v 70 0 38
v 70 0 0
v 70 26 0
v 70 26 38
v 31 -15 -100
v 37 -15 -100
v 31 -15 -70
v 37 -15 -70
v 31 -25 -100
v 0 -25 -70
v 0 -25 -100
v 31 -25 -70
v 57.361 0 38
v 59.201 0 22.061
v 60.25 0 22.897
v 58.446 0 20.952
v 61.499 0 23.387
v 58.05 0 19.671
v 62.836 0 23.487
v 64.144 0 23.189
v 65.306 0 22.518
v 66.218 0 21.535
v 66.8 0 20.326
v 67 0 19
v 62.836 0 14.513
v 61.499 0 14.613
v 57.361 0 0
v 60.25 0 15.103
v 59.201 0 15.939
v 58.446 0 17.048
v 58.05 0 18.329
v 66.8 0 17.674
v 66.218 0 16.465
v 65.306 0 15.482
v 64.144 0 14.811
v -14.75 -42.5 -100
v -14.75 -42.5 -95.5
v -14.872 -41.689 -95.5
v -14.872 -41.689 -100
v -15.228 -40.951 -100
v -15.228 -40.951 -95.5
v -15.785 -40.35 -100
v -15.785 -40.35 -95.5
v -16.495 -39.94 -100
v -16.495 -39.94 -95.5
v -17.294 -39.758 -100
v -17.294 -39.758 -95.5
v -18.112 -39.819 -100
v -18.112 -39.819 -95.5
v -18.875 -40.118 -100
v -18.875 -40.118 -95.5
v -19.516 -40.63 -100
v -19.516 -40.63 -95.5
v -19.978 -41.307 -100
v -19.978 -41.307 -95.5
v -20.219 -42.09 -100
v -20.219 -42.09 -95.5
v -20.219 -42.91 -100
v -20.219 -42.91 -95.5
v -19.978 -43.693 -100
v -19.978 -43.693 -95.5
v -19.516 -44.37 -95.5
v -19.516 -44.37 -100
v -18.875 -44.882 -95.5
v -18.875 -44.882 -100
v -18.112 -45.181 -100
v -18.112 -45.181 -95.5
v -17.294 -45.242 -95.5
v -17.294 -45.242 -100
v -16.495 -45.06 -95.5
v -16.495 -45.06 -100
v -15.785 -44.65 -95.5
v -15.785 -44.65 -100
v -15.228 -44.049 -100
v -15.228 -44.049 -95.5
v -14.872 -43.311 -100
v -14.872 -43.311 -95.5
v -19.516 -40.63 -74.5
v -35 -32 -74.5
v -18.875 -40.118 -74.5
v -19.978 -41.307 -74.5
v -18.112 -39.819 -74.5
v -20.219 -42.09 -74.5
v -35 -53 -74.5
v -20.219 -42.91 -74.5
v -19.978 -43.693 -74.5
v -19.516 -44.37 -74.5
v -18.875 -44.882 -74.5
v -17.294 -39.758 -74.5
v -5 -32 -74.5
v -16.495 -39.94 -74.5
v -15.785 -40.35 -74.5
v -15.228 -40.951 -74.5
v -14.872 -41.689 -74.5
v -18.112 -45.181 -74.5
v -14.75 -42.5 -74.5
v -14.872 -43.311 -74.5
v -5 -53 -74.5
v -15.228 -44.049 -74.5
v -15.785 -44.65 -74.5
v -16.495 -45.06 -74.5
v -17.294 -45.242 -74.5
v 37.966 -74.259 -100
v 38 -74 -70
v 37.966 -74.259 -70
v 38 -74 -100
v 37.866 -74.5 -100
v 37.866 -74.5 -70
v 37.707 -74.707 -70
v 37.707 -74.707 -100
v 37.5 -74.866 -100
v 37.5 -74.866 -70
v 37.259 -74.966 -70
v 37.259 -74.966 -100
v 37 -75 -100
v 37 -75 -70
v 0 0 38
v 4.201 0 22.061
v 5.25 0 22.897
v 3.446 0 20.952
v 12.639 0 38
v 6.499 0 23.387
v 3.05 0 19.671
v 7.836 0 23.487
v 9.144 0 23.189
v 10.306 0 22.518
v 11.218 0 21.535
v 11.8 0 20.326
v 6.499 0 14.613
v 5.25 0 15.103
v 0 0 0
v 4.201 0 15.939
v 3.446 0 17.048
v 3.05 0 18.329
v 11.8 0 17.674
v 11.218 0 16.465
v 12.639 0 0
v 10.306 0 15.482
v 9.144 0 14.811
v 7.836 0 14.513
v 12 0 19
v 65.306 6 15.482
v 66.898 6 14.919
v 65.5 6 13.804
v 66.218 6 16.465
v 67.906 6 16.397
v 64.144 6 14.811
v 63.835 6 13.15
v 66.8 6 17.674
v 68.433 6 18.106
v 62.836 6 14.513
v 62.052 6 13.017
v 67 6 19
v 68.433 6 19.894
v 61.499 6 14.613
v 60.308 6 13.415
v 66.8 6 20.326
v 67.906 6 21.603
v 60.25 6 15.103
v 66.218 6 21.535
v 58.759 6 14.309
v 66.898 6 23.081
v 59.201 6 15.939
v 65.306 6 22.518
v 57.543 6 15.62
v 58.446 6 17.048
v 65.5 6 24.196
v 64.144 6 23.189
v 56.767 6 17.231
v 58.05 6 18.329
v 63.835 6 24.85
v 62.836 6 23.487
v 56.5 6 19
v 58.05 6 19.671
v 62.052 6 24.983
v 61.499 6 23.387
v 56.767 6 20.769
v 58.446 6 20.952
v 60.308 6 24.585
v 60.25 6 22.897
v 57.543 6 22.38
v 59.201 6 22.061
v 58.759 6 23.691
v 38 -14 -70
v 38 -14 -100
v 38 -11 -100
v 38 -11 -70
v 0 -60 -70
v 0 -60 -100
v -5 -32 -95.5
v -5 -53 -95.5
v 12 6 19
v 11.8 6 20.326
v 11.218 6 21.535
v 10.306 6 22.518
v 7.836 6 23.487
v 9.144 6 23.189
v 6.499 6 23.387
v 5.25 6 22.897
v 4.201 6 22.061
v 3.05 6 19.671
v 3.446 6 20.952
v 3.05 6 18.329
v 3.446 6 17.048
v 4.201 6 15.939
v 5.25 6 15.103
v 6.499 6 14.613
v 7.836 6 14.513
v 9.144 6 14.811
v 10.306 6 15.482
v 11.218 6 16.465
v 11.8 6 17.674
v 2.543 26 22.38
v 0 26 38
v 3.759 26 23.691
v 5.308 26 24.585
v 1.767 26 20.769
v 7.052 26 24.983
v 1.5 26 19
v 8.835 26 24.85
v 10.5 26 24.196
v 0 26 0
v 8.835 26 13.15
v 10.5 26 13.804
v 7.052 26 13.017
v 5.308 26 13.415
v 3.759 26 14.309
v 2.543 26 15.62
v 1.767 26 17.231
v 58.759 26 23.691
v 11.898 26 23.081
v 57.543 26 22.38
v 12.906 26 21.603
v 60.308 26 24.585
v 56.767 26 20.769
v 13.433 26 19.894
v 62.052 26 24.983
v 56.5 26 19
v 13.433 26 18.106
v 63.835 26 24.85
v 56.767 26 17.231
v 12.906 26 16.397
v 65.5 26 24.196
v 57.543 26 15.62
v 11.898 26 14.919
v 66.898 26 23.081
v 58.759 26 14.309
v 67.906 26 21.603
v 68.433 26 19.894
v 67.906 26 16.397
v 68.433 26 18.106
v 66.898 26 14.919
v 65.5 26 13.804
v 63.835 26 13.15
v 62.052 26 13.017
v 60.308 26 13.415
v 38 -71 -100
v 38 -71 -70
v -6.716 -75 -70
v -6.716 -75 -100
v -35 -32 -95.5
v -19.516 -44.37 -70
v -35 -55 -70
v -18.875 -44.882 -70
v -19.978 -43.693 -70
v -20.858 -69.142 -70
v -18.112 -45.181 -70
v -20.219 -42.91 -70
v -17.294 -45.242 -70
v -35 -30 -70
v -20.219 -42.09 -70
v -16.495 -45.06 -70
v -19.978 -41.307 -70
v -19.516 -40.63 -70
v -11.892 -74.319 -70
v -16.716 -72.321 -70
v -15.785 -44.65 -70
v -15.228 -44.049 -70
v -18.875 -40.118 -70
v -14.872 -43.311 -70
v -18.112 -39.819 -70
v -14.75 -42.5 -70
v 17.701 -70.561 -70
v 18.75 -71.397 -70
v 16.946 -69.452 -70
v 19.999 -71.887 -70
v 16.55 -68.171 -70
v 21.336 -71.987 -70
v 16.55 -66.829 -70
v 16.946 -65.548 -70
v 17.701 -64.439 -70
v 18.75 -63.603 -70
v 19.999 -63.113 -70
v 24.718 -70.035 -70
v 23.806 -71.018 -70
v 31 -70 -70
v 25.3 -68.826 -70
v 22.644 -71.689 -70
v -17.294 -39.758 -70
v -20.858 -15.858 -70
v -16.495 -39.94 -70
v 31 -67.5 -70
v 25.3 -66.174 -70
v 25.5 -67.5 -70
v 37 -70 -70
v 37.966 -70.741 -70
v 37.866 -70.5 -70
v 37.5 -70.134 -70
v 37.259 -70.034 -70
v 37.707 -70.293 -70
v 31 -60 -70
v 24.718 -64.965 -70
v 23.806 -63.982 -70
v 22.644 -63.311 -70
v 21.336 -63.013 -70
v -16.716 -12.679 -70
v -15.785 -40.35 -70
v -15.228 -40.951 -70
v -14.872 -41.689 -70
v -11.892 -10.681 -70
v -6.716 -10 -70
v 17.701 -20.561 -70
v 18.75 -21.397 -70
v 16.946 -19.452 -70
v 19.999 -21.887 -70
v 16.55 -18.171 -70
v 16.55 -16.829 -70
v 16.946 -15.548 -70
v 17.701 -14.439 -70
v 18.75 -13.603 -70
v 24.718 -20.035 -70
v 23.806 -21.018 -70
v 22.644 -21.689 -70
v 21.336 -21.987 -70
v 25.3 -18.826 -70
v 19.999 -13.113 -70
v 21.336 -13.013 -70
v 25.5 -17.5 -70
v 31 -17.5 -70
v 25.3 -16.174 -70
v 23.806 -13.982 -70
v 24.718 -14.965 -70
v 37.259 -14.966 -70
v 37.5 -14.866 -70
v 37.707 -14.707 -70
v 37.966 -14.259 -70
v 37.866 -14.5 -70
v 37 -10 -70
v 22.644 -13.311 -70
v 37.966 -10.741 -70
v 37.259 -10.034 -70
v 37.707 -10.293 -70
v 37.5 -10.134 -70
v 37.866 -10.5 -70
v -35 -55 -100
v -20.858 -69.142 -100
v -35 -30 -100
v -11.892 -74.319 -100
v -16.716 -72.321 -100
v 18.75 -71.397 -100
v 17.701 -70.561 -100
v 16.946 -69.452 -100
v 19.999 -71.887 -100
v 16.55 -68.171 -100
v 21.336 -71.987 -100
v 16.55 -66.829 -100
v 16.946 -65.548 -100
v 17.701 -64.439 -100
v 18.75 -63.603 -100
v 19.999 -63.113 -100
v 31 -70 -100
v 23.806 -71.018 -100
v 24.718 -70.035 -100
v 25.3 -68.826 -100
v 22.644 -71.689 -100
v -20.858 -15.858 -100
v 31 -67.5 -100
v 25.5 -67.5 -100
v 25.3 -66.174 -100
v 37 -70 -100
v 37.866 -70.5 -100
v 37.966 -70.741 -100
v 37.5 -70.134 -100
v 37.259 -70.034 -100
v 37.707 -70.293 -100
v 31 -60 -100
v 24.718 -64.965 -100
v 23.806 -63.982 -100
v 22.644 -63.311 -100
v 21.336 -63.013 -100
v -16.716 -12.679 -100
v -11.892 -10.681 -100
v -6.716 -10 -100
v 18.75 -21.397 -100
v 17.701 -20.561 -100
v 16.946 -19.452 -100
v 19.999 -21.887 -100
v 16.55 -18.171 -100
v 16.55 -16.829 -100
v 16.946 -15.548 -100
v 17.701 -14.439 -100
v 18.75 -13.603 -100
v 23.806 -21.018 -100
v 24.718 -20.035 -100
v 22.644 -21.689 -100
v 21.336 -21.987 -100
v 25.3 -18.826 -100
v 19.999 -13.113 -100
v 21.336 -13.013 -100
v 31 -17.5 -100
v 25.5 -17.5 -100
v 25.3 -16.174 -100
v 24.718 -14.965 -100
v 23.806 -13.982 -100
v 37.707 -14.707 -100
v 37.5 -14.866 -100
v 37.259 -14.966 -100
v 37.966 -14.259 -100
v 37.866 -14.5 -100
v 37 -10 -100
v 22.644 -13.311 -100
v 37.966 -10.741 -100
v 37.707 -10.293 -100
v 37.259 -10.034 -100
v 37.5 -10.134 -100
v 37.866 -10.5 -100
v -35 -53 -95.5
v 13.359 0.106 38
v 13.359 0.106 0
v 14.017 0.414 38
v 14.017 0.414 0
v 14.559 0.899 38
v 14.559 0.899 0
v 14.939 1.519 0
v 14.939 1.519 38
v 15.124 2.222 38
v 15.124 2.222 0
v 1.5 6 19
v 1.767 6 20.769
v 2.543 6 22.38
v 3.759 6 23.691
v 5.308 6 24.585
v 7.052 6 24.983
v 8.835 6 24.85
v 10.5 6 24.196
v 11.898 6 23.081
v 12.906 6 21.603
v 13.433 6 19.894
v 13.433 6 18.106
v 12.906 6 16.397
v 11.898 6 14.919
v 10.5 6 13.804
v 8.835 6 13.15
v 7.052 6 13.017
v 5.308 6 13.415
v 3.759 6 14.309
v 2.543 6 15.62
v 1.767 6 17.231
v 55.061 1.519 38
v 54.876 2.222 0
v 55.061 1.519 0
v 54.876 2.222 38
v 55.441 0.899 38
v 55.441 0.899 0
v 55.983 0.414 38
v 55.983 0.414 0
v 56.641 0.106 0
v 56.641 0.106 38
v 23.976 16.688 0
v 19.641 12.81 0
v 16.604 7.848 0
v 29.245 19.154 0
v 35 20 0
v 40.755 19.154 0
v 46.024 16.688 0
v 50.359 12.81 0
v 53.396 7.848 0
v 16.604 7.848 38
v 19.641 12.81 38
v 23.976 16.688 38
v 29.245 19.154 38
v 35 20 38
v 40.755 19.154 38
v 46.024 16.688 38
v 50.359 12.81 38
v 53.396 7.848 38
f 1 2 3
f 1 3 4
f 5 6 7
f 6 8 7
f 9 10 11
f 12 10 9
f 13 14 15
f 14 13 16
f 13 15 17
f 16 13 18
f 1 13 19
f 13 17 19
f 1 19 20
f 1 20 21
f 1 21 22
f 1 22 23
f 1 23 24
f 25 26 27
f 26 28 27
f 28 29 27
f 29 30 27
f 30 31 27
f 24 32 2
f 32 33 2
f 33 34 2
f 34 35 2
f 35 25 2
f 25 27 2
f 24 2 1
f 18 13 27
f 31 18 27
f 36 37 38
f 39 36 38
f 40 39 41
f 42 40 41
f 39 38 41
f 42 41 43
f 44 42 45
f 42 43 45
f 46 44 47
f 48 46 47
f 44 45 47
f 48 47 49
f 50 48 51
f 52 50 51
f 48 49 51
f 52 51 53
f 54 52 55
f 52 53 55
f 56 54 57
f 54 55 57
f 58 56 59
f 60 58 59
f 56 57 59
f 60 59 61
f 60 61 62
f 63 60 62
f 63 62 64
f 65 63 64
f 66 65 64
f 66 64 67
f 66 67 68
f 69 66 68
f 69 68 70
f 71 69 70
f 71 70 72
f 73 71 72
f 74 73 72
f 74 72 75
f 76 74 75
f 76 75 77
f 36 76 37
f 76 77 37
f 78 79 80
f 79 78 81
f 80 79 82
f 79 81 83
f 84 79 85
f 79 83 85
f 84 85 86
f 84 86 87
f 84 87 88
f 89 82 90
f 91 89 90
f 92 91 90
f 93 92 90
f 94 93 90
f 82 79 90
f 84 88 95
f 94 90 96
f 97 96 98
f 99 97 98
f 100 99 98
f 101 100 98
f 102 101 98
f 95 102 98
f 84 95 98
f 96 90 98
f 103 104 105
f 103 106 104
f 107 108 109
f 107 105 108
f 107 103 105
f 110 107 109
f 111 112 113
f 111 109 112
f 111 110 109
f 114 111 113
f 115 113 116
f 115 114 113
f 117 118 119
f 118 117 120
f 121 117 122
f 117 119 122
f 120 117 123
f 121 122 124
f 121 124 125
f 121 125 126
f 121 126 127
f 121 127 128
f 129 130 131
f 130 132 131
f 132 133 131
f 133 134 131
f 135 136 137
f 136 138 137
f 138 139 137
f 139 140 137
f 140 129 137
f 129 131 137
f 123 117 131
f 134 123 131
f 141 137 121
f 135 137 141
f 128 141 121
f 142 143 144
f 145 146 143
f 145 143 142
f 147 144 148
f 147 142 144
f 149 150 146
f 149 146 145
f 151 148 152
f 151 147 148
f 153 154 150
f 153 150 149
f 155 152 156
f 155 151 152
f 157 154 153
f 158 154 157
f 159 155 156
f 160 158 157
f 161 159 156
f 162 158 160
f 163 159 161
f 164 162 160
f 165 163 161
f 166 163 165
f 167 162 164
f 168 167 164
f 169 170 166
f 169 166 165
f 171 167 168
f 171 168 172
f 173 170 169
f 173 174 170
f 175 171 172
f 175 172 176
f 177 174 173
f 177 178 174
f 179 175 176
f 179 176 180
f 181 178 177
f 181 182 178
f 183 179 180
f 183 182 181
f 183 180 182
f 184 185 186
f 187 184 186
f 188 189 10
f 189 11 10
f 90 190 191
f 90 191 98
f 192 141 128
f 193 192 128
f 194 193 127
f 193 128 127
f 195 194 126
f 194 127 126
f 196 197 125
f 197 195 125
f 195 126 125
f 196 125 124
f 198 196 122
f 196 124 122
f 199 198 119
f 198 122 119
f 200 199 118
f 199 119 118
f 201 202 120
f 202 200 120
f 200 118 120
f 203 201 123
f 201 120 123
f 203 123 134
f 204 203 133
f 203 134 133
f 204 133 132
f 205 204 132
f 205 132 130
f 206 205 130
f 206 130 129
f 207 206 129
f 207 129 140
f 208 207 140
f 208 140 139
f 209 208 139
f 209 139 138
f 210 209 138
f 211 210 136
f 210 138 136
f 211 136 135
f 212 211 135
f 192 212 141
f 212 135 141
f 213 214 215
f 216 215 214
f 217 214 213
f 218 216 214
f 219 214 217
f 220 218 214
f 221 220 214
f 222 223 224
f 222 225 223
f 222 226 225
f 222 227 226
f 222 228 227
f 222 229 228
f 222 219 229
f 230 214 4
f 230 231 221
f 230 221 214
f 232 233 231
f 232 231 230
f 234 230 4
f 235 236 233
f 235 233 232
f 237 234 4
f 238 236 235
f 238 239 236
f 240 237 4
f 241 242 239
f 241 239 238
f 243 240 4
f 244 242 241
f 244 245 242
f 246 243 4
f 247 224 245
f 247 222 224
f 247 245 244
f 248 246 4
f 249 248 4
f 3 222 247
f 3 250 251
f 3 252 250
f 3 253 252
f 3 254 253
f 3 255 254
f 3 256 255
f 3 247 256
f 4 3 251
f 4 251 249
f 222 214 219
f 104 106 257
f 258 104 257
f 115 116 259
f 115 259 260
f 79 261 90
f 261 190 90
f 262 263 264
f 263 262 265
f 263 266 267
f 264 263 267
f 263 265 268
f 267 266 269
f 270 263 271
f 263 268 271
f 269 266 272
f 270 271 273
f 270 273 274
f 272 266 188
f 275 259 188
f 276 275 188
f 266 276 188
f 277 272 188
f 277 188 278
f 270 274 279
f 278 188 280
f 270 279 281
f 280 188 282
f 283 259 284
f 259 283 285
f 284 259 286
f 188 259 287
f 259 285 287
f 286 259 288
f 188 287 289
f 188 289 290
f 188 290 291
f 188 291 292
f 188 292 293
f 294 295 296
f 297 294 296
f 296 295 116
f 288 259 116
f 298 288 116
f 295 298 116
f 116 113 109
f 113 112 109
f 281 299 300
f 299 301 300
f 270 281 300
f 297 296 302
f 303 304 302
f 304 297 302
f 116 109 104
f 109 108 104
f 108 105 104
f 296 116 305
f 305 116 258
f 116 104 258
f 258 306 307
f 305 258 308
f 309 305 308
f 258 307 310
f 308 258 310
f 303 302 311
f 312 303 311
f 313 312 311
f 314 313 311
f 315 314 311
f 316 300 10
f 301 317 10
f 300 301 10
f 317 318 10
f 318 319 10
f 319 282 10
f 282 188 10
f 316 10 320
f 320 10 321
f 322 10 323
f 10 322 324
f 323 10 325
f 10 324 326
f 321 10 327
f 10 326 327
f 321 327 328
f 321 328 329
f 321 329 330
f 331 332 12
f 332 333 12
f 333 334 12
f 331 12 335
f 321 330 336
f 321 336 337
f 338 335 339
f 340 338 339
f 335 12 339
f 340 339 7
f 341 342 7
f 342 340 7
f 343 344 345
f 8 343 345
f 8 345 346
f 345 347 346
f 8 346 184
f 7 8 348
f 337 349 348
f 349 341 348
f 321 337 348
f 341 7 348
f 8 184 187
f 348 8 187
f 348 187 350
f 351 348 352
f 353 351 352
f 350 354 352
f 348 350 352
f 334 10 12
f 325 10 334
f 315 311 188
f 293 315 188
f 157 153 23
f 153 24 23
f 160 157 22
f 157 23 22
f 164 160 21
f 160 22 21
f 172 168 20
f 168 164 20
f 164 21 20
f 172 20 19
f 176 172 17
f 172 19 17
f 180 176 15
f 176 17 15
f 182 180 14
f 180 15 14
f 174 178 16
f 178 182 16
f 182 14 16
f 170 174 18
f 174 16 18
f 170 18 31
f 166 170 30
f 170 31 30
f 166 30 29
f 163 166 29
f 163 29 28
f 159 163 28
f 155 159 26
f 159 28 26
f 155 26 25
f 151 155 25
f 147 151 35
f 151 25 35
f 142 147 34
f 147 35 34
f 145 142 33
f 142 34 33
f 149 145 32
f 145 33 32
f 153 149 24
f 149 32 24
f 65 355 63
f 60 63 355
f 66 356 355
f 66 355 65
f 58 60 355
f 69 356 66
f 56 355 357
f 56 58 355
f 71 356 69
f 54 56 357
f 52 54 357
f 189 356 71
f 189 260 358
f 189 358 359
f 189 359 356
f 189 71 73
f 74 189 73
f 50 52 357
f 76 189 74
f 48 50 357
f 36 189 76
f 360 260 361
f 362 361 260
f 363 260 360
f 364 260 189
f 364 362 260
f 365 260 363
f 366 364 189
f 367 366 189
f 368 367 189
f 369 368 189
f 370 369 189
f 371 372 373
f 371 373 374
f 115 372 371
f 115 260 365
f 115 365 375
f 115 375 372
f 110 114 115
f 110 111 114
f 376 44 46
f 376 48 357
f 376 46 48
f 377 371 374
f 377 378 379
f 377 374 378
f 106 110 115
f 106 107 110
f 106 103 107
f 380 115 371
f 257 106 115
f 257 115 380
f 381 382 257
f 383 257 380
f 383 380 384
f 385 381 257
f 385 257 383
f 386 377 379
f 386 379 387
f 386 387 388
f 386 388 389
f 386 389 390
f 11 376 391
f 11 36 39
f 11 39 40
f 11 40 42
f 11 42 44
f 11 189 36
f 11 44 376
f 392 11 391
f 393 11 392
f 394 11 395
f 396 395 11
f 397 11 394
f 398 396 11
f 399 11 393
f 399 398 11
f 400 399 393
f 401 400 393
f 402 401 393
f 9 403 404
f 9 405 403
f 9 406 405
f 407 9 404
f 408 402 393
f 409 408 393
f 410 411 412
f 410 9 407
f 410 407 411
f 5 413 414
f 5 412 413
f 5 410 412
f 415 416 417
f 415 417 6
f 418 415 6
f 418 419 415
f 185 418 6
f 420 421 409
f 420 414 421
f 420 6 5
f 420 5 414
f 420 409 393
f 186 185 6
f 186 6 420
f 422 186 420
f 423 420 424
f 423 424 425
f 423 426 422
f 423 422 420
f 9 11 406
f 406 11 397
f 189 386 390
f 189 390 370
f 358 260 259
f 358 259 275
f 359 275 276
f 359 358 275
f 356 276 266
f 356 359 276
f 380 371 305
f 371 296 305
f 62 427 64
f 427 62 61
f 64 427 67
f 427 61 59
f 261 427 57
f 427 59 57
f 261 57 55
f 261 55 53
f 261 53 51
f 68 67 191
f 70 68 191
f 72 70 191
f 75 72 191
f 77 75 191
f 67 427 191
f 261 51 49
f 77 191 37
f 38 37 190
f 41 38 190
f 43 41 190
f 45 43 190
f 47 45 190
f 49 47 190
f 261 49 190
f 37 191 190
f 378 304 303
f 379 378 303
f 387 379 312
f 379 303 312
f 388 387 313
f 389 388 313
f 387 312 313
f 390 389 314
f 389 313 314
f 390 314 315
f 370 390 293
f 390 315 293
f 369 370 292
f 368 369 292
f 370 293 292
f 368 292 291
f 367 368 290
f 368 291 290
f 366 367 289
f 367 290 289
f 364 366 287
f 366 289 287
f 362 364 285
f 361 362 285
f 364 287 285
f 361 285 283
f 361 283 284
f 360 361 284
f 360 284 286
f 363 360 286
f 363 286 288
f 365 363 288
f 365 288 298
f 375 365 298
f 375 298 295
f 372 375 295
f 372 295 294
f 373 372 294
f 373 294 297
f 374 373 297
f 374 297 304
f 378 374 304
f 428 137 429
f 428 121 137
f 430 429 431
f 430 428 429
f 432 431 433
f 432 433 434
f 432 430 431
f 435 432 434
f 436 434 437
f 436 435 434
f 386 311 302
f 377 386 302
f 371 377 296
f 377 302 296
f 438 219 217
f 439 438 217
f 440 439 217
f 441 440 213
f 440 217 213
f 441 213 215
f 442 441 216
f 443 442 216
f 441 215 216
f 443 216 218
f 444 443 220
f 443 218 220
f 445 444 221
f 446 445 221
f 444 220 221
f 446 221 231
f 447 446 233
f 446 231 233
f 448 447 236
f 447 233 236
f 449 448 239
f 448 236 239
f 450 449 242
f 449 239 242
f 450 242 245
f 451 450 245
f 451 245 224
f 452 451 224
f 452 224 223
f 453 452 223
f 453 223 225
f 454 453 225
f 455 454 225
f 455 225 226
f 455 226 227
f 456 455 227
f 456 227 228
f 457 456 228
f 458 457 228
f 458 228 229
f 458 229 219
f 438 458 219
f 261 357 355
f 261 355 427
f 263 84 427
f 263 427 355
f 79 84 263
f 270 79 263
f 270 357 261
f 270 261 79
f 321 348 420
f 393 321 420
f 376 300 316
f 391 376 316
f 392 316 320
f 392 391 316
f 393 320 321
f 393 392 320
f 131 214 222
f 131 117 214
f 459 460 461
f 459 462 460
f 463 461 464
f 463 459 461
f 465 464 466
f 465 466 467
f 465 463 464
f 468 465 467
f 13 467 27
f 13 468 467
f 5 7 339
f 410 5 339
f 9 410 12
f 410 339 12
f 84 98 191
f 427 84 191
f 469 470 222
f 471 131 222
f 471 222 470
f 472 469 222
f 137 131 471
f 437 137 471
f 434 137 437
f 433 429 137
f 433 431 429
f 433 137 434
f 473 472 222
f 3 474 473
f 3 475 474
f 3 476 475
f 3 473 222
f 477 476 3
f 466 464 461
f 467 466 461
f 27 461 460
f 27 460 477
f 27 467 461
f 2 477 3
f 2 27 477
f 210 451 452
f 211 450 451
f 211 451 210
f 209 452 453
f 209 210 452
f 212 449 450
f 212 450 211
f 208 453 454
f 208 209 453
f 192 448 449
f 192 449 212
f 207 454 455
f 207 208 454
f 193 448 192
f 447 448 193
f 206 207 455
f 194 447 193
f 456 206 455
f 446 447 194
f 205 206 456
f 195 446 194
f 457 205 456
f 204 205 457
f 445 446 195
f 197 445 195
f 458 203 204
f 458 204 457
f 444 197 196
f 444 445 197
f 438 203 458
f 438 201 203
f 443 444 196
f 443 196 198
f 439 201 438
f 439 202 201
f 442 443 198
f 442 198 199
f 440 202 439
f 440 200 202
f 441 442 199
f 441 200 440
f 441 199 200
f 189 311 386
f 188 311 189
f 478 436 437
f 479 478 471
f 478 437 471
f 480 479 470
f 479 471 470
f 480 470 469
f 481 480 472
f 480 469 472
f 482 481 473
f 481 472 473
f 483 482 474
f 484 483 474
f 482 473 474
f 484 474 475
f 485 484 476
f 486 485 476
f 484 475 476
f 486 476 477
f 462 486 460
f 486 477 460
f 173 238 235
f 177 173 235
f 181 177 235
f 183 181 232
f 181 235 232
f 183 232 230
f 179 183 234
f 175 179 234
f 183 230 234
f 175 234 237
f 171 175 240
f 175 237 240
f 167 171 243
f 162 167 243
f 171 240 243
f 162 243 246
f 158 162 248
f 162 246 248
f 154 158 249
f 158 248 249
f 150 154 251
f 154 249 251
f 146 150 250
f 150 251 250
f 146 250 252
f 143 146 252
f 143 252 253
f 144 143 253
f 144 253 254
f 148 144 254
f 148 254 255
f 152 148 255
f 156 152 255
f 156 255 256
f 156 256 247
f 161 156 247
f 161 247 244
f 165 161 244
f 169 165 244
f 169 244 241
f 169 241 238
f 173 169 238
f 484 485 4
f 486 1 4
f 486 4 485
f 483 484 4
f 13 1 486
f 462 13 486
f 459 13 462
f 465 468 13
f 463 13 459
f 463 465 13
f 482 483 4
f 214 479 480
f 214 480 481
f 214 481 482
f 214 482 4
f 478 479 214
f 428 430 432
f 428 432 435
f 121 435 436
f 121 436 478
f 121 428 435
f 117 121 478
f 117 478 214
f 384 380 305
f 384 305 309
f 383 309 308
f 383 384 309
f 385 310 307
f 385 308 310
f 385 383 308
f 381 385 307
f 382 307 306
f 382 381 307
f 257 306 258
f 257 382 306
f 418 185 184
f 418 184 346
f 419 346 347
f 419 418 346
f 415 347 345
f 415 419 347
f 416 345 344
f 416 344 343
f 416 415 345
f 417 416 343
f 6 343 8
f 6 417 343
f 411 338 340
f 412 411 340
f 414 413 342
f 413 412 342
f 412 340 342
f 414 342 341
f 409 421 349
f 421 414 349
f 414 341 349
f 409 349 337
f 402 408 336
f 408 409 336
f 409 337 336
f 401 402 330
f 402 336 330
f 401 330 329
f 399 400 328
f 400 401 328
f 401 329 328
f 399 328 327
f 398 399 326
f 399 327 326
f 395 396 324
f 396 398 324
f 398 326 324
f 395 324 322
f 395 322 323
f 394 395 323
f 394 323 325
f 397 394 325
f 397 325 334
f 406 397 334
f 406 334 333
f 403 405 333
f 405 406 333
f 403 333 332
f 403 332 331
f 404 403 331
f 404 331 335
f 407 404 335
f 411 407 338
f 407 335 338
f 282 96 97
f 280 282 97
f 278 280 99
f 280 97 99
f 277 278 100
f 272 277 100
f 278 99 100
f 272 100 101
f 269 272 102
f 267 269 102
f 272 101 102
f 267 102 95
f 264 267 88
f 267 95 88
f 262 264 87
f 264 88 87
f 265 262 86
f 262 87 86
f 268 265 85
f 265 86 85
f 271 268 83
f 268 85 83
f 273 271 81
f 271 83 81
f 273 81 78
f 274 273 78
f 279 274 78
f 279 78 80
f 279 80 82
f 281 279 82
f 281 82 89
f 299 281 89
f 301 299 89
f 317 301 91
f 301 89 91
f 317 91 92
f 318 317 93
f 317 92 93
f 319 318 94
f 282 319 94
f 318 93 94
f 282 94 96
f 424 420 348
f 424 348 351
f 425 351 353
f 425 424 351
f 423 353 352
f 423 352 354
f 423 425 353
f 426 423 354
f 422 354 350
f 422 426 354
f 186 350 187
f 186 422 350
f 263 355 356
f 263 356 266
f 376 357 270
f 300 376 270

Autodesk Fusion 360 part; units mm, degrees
sketch "Skizze1" plane through (0, 0, 0) normal (0, 1, 0) x (1, 0, 0)
  line L0 (0, 0) -> (70, 0)
  line L1 (70, 0) -> (70, -38)
  line L2 (70, -38) -> (0, -38)
  line L3 (0, -38) -> (0, 0)
  line L4 (0, 0) -> (15, 0)
  line L5 (15, 0) -> (15, -38)
  line L6 (15, -38) -> (0, -38)
  line L7 (0, -38) -> (0, 0)
  line L8 (70, 0) -> (55, 0)
  line L9 (55, 0) -> (55, -38)
  line L10 (55, -38) -> (70, -38)
  line L11 (70, -38) -> (70, 0)
  circle A0 centre (62.5, -19) radius 4.5
  circle A1 centre (7.5, -19) radius 4.5
  dimension "d1" = 70
  dimension "d2" = 38
  dimension "d3" = 15
  dimension "d4" = 15
  dimension "d5" = 9
  dimension "d6" = 9
extrude "Extrusion1" add sketch "Skizze1" along normal blind 26 makes body 1
sketch "Skizze2" plane through (0, 0, 0) normal (0, 0, -1) x (-1, 0, 0)
  line L0 (-70, 0) -> (0, 0)
  line L1 (0, 0) -> (0, 26)
  line L2 (0, 26) -> (-70, 26)
  line L3 (-70, 26) -> (-70, 0)
  line L4 (0, 0) -> (-15, 0)
  line L5 (-15, 0) -> (-15, 26)
  line L6 (-15, 26) -> (0, 26)
  line L7 (0, 26) -> (0, 0)
  line L8 (-70, 0) -> (-55, 0)
  line L9 (-55, 0) -> (-55, 26)
  line L10 (-55, 26) -> (-70, 26)
  line L11 (-70, 26) -> (-70, 0)
  circle A0 centre (-35, 0) radius 20
  dimension "d9" = 15
  dimension "d10" = 15
extrude "Extrusion2" cut sketch "Skizze2" against normal blind 100 contours L0 A0 picked at (-29.4917, 5.7427) bodies 1
fillet "Abrundung1" radius 2.5 2 edges at (15, 0, 19) (55, 0, 19) on bodies 1
sketch "Skizze3" plane through (0, 0, 0) normal (0, 0, -1) x (-1, 0, 0)
  arc A0 (-57.3607, 0) -> (-54.8762, 2.2222) centre (-57.3607, 2.5) ccw
  arc A1 (-15.1238, 2.2222) -> (-54.8762, 2.2222) centre (-35, 0) ccw
  arc A2 (-15.1238, 2.2222) -> (-12.6393, 0) centre (-12.6393, 2.5) ccw
  line L0 (-12.6393, 0) -> (0, 0)
  line L1 (0, 0) -> (0, 26)
  line L2 (0, 26) -> (-70, 26)
  line L3 (-70, 26) -> (-70, 0)
  line L4 (-70, 0) -> (-57.3607, 0)
  line L5 (0, 26) -> (-15, 26)
  line L6 (-15, 26) -> (-15, 0)
  line L7 (-15, 0) -> (0, 0)
  line L8 (0, 0) -> (0, 26)
  line L9 (-70, 26) -> (-55, 26)
  line L10 (-55, 26) -> (-55, 0)
  line L11 (-55, 0) -> (-70, 0)
  line L12 (-70, 0) -> (-70, 26)
  dimension "d15" = 15
  dimension "d16" = 15
ref_plane "Arbeitsebene1" through (0, 0, -70) normal (0, 0, 1) x (1, 0, 0)
sketch "Skizze4" plane through (0, 0, -70) normal (0, 0, 1) x (1, 0, 0)
  line L0 (0, -75) -> (38, -75)
  line L1 (38, -75) -> (38, -60)
  line L2 (38, -60) -> (0, -60)
  line L3 (0, -60) -> (0, -75)
  line L4 (38, -67.5) -> (21, -67.5)
  circle A0 centre (21, -67.5) radius 4.5
  line L5 (38, -60) -> (31, -60)
  line L6 (31, -60) -> (31, -70)
  line L7 (31, -70) -> (38, -70)
  line L8 (38, -70) -> (38, -60)
  dimension "d18" = 38
  dimension "d19" = 15
  dimension "d20" = 17
  dimension "d21" = 9
  dimension "d22" = 7
  dimension "d23" = 10
extrude "Extrusion3" add sketch "Skizze4" against normal blind 30 separate body contours L0 L1 L2 L3 L6 L7 makes body 2
copy_body "Körper kopieren/einfügen1" bodies 2 makes body 3
mirror "Spiegeln1" about plane through (0, 0, -100) normal (0, 0, 1) of bodies 2 makes body 4
move_body "Verschieben1" bodies 4 to x (1, 0, 0) y (0, 1, 0) z (0, 0, 1) at (0, 0, -35)
move_body "Verschieben2" bodies 4 to x (1, 0, 0) y (0, -1, 0) z (0, 0, -1) at (0, -85, -235)
sketch "Skizze5" plane through (0, 0, 0) normal (-1, 0, 0) x (0, 0, 1)
  line L0 (-70, -25) -> (-70, -10)
  line L1 (-70, -10) -> (-100, -10)
  line L2 (-100, -10) -> (-100, -25)
  line L3 (-100, -25) -> (-70, -25)
  line L4 (-100, -10) -> (-70, -10)
  line L5 (-70, -10) -> (-70, -75)
  line L6 (-70, -75) -> (-100, -75)
  line L7 (-100, -75) -> (-100, -10)
extrude "Extrusion4" add sketch "Skizze5" along normal blind 30 bodies 2 3 4
sketch "Skizze6" plane through (-30, 0, 0) normal (-1, 0, 0) x (0, 0, 1)
  line L0 (-100, -75) -> (-70, -75)
  line L1 (-70, -75) -> (-70, -10)
  line L2 (-70, -10) -> (-100, -10)
  line L3 (-100, -10) -> (-100, -75)
  line L4 (-100, -10) -> (-70, -10)
  line L5 (-70, -10) -> (-70, -75)
  line L6 (-70, -75) -> (-100, -75)
  line L7 (-100, -75) -> (-100, -10)
  line L8 (-74.5, -53) -> (-95.5, -53)
  line L9 (-95.5, -53) -> (-95.5, -32)
  line L10 (-95.5, -32) -> (-74.5, -32)
  line L11 (-74.5, -32) -> (-74.5, -53)
  line L12 (-74.5, -53) -> (-95.5, -32) construction
  line L13 (-95.5, -53) -> (-74.5, -32) construction
  point P0 (-85, -42.5)
  dimension "d30" = 21
  dimension "d31" = 21
extrude "Extrusion5" cut sketch "Skizze6" against normal blind 25 contours L8 L9 L10 L11 bodies 2
sketch "Skizze7" plane through (0, 0, -95.5) normal (0, 0, 1) x (1, 0, 0)
  line L0 (-30, -32) -> (-30, -53)
  line L1 (-30, -53) -> (-5, -53)
  line L2 (-5, -53) -> (-5, -32)
  line L3 (-5, -32) -> (-30, -32)
  line L4 (-5, -53) -> (-30, -53)
  line L5 (-30, -53) -> (-30, -32)
  line L6 (-30, -32) -> (-5, -32)
  line L7 (-5, -32) -> (-5, -53)
  circle A0 centre (-17.5, -42.5) radius 2.75
  dimension "d34" = 5.5
extrude "Extrusion6" cut sketch "Skizze7" along normal blind 37 contours A0 bodies 2
extrude "Extrusion7" cut sketch "Skizze7" against normal blind 10 contours A0 bodies 2
extrude "Extrusion8" add 1 faces at (-30, -67.6667, -81.5) along direction (-1, 0, 0) blind 5 on bodies 2 bodies 2
chamfer "Fase1" distance 20 angle 45 2 edges at (-35, -75, -85) (-35, -10, -85) on bodies 2
fillet "Abrundung2" radius 1 4 edges at (38, -15, -85) (38, -10, -85) (38, -75, -85) (38, -70, -85) on bodies 2
fillet "Abrundung3" radius 20 2 edges at (-15, -75, -85) (-15, -10, -85) on bodies 2
sketch "Skizze8" plane through (0, 26, 0) normal (0, 1, 0) x (-1, 0, 0)
  circle A0 centre (-7.5, 19) radius 4.5
  circle A1 centre (-62.5, 19) radius 4.5
  line L0 (0, 38) -> (-70, 38)
  line L1 (-70, 38) -> (-70, 0)
  line L2 (-70, 0) -> (0, 0)
  line L3 (0, 0) -> (0, 38)
  circle A2 centre (-7.5, 19) radius 6
  circle A3 centre (-62.5, 19) radius 6
  dimension "d46" = 12
  dimension "d47" = 12
extrude "Extrusion9" cut sketch "Skizze8" against normal blind 20 contours A2 | A3 bodies 1
